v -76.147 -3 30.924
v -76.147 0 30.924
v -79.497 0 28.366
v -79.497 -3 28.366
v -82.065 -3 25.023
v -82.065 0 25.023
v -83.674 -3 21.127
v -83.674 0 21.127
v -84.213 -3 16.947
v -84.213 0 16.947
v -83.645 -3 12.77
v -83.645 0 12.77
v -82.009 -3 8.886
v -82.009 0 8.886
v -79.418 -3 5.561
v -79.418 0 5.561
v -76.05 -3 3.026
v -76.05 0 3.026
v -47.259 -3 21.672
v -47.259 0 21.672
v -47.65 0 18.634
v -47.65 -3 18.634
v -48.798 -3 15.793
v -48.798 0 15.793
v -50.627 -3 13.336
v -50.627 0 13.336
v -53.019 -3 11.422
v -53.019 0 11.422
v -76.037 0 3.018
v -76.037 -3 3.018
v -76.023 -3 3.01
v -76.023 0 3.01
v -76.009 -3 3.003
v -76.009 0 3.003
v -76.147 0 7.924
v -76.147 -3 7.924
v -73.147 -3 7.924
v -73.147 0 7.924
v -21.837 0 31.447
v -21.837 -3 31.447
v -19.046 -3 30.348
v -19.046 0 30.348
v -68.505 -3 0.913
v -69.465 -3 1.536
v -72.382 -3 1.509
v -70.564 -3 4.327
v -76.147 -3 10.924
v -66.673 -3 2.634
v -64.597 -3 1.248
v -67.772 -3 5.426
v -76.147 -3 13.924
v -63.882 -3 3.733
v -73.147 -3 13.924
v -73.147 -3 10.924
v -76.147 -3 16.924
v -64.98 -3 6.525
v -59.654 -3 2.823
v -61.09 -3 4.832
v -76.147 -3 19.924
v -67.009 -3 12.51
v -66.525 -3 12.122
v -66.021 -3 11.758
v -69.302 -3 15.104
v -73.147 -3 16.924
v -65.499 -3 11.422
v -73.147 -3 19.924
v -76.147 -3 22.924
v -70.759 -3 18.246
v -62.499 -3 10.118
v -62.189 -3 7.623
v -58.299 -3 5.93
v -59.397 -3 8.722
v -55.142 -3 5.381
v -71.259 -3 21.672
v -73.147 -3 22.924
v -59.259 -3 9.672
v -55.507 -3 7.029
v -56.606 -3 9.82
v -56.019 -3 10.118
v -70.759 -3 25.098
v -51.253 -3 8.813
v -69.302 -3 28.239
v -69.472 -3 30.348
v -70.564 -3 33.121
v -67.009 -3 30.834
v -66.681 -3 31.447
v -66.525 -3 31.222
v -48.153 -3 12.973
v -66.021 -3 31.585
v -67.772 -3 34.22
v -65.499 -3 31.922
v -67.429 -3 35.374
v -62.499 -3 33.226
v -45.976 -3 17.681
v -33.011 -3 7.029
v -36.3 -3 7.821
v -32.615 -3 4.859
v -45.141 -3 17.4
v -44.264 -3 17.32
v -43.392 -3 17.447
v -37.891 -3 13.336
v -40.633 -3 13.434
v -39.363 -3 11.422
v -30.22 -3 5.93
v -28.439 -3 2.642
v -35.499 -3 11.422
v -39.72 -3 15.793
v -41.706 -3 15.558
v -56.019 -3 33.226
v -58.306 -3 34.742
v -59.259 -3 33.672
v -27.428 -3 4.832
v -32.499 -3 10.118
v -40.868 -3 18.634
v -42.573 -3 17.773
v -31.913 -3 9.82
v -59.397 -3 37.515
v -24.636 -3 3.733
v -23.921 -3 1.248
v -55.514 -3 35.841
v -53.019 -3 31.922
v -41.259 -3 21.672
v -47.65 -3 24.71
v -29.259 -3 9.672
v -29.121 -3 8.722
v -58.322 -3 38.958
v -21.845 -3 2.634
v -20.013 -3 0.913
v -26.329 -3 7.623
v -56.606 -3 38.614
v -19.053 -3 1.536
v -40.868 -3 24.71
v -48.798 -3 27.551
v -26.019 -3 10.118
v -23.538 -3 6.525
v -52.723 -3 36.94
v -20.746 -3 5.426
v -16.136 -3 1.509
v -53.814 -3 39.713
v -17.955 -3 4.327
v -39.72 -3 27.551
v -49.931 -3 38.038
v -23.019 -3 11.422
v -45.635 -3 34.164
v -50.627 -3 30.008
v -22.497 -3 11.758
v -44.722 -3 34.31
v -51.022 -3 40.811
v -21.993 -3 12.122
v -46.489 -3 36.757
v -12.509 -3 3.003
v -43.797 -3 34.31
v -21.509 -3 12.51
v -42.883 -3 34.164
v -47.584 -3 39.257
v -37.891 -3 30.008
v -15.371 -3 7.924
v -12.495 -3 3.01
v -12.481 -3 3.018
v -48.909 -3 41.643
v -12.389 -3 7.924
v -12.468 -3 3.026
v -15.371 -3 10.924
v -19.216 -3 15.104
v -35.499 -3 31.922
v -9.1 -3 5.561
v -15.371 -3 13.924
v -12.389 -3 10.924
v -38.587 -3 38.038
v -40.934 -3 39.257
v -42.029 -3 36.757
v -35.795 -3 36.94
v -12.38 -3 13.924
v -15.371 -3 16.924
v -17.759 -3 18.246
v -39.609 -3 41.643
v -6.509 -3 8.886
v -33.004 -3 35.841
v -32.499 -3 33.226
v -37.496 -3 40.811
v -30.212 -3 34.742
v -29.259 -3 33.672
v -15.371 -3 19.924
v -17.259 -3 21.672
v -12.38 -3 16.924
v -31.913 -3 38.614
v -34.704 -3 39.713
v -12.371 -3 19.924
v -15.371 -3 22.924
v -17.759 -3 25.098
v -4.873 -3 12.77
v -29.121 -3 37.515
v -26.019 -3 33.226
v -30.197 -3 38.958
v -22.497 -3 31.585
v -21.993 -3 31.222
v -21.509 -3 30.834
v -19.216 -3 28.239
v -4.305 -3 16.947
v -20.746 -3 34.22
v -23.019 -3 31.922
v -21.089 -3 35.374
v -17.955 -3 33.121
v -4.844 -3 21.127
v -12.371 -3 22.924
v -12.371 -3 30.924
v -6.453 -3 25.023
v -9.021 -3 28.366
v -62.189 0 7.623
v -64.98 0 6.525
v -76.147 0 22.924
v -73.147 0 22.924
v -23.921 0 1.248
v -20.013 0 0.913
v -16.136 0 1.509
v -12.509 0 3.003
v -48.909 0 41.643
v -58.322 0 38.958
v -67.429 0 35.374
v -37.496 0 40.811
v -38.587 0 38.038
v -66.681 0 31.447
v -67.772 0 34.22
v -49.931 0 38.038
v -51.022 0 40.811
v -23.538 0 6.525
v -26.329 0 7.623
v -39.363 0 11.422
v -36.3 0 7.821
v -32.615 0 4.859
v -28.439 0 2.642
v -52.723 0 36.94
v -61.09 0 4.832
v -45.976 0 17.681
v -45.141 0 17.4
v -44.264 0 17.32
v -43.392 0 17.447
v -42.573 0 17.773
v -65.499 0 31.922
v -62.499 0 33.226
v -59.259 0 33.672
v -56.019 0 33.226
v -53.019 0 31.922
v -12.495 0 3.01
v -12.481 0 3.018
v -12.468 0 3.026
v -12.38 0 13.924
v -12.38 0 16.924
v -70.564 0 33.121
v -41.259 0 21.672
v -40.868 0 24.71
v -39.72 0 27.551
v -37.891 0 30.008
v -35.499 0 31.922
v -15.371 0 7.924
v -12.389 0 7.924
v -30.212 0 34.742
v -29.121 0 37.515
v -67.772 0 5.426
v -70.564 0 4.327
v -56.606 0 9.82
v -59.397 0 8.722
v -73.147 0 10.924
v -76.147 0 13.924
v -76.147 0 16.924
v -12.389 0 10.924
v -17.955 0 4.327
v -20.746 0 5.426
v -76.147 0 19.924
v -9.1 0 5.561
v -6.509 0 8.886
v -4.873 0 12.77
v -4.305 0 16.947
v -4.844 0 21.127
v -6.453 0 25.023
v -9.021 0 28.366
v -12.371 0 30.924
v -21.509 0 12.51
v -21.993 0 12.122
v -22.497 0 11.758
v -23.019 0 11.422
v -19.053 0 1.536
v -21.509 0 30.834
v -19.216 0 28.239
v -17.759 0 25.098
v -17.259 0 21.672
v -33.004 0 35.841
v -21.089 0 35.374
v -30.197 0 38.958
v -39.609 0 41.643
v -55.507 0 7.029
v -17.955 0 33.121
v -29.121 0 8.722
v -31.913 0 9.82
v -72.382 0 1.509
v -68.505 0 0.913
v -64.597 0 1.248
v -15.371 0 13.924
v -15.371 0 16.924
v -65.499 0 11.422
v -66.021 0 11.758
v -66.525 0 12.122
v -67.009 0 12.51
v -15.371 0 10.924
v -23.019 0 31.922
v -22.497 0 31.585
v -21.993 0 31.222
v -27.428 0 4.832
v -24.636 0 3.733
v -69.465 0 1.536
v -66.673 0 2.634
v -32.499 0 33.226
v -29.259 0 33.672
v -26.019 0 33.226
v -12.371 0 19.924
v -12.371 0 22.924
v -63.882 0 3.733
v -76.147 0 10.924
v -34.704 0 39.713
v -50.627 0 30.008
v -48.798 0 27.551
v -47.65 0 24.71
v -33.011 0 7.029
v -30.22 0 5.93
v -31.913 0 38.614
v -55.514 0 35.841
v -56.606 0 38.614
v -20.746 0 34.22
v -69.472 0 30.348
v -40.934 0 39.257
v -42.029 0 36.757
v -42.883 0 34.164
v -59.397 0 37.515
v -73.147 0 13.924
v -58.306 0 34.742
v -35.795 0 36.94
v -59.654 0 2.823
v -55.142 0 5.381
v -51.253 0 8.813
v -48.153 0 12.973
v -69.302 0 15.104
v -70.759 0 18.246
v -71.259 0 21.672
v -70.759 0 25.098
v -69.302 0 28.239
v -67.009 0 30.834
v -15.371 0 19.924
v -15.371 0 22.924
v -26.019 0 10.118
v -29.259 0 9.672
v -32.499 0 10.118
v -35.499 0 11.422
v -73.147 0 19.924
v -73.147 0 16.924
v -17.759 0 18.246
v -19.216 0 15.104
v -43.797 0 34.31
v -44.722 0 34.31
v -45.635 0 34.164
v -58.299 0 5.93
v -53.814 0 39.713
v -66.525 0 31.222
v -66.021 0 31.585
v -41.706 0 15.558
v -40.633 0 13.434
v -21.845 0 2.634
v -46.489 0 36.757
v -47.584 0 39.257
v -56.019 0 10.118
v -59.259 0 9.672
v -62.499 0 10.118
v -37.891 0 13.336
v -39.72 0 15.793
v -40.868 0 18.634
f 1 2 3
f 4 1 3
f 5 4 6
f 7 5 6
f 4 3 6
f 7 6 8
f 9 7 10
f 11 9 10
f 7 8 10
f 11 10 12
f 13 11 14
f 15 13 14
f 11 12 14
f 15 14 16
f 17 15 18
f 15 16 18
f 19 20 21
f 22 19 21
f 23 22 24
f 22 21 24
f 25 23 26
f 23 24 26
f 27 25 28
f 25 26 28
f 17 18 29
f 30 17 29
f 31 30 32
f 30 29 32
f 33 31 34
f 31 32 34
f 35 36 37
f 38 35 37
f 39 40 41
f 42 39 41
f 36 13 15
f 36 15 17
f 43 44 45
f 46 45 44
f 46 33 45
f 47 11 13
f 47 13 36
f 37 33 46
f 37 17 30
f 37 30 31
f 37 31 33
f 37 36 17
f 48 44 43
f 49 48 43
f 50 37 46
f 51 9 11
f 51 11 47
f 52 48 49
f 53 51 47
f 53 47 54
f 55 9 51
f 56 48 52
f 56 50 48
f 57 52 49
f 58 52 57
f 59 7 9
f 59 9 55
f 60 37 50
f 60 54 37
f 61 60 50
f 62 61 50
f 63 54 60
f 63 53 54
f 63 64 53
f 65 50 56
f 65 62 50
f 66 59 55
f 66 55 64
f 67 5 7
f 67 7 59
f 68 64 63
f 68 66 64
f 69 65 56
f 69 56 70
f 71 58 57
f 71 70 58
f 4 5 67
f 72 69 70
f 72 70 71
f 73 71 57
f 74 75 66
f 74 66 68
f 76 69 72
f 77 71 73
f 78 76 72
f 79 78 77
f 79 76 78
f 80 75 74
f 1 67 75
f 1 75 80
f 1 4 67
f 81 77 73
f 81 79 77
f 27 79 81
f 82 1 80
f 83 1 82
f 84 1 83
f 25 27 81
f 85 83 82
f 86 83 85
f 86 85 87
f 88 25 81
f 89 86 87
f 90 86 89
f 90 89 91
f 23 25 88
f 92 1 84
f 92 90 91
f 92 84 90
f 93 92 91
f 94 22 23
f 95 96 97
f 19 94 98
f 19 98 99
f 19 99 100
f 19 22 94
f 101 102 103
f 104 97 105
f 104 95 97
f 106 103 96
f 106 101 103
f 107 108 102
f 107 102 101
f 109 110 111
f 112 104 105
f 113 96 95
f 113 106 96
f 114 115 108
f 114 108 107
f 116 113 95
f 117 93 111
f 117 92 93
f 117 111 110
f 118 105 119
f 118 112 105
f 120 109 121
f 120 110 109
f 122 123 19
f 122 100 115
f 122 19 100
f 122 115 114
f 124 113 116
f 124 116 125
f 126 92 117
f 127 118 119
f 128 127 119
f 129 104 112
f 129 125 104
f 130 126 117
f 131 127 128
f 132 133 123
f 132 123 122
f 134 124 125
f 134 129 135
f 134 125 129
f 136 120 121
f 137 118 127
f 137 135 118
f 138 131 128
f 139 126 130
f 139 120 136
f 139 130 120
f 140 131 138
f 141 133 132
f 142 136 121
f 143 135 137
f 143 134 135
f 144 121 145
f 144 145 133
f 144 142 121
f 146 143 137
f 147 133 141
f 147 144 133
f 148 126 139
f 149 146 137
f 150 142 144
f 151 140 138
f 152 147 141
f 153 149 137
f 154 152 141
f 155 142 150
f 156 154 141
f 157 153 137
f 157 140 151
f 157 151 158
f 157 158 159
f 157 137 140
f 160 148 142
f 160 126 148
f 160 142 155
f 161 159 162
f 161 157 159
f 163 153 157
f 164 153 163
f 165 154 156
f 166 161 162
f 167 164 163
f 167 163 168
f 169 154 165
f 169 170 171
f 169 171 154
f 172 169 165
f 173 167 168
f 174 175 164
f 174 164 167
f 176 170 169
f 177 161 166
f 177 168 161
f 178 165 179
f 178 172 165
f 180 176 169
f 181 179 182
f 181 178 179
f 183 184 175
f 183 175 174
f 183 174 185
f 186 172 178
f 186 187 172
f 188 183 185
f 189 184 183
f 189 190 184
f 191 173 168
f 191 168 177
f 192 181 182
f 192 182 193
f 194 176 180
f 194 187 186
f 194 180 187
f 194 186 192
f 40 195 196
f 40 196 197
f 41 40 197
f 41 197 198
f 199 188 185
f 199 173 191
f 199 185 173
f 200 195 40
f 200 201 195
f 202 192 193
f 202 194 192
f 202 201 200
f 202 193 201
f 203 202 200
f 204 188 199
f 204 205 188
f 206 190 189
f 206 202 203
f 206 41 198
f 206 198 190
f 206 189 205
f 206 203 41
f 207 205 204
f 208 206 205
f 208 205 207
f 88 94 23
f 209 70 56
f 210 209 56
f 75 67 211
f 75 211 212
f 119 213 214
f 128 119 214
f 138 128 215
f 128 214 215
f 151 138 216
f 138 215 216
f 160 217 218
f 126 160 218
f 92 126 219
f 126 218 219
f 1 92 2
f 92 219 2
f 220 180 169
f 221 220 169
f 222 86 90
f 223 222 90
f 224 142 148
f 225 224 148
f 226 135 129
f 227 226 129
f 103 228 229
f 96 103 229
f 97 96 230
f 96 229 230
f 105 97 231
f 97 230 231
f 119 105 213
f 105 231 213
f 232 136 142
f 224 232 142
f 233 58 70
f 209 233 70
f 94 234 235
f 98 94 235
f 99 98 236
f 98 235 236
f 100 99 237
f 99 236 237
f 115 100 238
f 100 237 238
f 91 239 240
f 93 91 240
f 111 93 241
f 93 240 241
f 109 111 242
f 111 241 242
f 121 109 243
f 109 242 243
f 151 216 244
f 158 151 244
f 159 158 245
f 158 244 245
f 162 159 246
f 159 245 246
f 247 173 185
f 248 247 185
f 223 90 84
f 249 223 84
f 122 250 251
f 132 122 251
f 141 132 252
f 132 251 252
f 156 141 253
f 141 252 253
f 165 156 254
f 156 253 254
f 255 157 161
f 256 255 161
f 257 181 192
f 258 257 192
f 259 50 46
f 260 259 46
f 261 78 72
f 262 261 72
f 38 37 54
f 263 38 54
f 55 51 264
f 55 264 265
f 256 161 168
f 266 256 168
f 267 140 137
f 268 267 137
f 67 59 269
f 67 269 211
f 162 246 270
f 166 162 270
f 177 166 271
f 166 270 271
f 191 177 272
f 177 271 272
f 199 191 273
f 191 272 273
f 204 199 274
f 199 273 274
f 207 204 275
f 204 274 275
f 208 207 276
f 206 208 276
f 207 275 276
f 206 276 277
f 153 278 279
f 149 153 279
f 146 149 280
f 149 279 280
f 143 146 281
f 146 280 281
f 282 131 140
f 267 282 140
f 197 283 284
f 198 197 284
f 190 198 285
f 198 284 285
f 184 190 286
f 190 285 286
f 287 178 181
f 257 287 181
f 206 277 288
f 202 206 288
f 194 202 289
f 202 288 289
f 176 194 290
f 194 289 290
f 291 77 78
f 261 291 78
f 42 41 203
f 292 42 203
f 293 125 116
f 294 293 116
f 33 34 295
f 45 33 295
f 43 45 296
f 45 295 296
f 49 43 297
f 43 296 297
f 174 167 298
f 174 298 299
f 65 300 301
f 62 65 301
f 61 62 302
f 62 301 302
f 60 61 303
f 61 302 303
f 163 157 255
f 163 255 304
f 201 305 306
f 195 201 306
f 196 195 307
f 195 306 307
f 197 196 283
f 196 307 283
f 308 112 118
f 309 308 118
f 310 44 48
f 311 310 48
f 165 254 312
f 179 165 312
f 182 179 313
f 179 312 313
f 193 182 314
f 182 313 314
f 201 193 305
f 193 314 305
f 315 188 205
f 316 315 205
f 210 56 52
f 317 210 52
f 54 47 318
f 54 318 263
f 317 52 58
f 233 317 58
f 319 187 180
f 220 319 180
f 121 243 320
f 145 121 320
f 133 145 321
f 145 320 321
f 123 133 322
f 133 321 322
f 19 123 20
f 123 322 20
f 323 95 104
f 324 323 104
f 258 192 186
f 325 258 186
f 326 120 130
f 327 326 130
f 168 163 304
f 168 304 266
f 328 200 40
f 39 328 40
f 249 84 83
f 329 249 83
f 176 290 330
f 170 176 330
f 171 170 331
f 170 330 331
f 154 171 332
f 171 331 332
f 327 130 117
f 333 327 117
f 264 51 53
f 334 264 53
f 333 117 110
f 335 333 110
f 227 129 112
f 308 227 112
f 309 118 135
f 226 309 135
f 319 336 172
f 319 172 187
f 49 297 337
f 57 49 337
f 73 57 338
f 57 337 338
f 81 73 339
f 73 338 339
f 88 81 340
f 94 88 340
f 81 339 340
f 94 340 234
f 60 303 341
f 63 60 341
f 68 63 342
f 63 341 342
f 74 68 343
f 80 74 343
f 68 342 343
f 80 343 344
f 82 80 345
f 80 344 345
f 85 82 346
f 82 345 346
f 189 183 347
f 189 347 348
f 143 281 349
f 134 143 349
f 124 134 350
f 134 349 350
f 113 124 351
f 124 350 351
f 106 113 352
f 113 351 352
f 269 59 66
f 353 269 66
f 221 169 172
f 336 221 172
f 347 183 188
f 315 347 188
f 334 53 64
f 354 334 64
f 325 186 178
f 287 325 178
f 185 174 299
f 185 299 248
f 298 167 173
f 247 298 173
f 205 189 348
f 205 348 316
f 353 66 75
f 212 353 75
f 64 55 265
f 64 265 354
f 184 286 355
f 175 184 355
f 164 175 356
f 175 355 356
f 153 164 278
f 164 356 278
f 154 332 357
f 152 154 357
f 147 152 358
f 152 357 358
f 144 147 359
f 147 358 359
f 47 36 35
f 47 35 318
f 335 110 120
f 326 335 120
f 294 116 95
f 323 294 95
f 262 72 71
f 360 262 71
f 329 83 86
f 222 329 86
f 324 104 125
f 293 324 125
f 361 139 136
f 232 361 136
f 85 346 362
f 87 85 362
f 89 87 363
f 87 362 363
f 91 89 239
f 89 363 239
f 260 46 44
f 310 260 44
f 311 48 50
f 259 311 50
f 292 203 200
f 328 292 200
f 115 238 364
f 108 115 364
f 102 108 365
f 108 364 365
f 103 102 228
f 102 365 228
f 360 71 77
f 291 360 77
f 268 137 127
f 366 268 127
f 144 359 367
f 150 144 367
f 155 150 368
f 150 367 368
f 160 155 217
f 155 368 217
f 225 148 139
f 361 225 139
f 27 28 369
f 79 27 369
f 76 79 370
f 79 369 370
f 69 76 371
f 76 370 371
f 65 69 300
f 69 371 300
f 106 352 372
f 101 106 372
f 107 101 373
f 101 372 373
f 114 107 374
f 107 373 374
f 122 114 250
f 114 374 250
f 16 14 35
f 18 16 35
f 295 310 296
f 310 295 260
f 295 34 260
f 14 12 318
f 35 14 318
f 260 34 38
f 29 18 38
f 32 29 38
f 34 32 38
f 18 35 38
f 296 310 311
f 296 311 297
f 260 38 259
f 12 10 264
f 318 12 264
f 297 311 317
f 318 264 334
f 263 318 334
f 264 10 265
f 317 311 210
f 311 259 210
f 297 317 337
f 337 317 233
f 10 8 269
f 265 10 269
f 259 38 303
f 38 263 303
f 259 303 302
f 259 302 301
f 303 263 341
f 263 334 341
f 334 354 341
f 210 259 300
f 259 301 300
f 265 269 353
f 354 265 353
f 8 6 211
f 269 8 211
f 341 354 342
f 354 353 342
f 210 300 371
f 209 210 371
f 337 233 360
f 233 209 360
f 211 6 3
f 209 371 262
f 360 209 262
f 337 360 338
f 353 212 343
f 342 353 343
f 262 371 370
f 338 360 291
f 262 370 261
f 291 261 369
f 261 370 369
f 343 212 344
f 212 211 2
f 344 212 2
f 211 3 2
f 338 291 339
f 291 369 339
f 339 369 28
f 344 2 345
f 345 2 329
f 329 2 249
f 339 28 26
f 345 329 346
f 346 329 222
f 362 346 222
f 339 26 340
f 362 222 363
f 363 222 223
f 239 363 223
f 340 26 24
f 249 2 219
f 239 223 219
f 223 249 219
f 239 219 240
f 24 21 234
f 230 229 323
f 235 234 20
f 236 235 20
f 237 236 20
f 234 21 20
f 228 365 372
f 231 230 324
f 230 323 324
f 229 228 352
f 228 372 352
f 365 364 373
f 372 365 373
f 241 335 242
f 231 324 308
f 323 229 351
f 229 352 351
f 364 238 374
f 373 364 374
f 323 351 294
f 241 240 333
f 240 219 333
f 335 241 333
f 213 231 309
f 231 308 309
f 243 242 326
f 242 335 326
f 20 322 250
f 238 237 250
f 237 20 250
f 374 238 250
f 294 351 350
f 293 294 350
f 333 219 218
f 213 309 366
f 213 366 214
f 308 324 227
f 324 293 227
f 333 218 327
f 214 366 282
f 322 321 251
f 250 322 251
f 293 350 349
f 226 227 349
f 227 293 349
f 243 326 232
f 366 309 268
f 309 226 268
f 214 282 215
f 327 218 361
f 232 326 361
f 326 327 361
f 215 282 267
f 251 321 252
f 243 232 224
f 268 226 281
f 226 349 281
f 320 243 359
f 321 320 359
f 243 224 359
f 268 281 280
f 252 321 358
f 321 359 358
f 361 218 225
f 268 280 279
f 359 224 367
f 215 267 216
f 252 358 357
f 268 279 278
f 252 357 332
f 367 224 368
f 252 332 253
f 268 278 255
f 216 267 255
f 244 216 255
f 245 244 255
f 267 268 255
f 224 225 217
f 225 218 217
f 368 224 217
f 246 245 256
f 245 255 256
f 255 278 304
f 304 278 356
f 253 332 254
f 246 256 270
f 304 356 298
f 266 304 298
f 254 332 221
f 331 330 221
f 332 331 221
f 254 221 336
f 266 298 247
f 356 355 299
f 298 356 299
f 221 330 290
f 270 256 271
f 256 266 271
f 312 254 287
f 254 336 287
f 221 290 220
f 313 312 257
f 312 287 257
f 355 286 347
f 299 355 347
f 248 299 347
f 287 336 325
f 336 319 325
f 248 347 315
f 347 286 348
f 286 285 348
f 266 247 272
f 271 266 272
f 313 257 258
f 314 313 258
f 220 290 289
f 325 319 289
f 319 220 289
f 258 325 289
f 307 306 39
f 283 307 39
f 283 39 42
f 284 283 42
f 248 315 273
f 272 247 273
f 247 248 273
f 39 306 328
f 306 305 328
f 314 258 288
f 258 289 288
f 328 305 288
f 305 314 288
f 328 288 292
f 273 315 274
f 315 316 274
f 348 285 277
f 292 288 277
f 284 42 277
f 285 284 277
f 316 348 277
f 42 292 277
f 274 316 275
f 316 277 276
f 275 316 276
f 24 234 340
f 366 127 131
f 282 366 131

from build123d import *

# Parameters (mm, degrees)
F1_DEPTH = 3
F2_W     = 2.9827502628
F2_H     = 3
F2_W_2   = 2.9913751314
F2_W_3   = 3
F3_DEPTH = 25


# Not quite as in the source:
# - ends of sketch curves that miss each other by under 0.0002 mm in the source are joined


with BuildPart() as f1:
    # F0 (on Front) → F1 (new body)
    with BuildSketch(Plane.XZ):
        with BuildLine():
            ThreePointArc((-65.4990487043, 31.9219294953), (-59.2590567172, 33.6719294953), (-53.01906473, 31.9219294953))
            Line((-53.01906473, 31.9219294953), (-45.1069841329, 31.9219294953))
            ThreePointArc((-45.1069841329, 31.9219294953), (-45.3487223927, 33.0483271736), (-45.635105941, 34.1642095953))
            ThreePointArc((-45.635105941, 34.1642095953), (-47.0071291889, 38.0195574022), (-48.9092989792, 41.6428024387))
            ThreePointArc((-48.9092989792, 41.6428024387), (-62.9189036621, 37.276531414), (-76.1468158191, 30.9239188806))
            ThreePointArc((-76.1468158191, 30.9239188806), (-84.213049611, 16.9468180053), (-76.0504636415, 3.0257667966))
            ThreePointArc((-76.0504636415, 3.0257667966), (-76.029966864, 3.0142304296), (-76.0094479368, 3.0027335048))
            ThreePointArc((-76.0094479368, 3.0027335048), (-70.4614460946, 1.0953454703), (-64.596721114, 1.2484939552))
            ThreePointArc((-64.596721114, 1.2484939552), (-55.9033559949, 4.8590380101), (-49.1550909719, 11.4219294953))
            Line((-49.1550909719, 11.4219294953), (-53.01906473, 11.4219294953))
            ThreePointArc((-53.01906473, 11.4219294953), (-59.2590567172, 9.6719294953), (-65.4990487043, 11.4219294953))
            Line((-65.4990487043, 11.4219294953), (-67.0090567172, 11.4219294953))
            Line((-67.0090567172, 11.4219294953), (-67.0090567172, 12.5101883944))
            ThreePointArc((-67.0090567172, 12.5101883944), (-71.2590567172, 21.6719294953), (-67.0090567172, 30.8336705962))
            Line((-67.0090567172, 30.8336705962), (-67.0090567172, 31.9219294953))
            Line((-67.0090567172, 31.9219294953), (-65.4990487043, 31.9219294953))
        make_face()
        with BuildLine():
            ThreePointArc((-42.8830074933, 34.1642095953), (-43.1693910416, 33.0483271736), (-43.4111293014, 31.9219294953))
            Line((-43.4111293014, 31.9219294953), (-35.4990487043, 31.9219294953))
            ThreePointArc((-35.4990487043, 31.9219294953), (-29.2590567172, 33.6719294953), (-23.01906473, 31.9219294953))
            Line((-23.01906473, 31.9219294953), (-21.5090567172, 31.9219294953))
            Line((-21.5090567172, 31.9219294953), (-21.5090567172, 30.8336705962))
            ThreePointArc((-21.5090567172, 30.8336705962), (-18.3732861886, 26.7216819645), (-17.2590567172, 21.6719294953))
            ThreePointArc((-17.2590567172, 21.6719294953), (-18.3732861886, 16.6221770261), (-21.5090567172, 12.5101883944))
            Line((-21.5090567172, 12.5101883944), (-21.5090567172, 11.4219294953))
            Line((-21.5090567172, 11.4219294953), (-23.01906473, 11.4219294953))
            ThreePointArc((-23.01906473, 11.4219294953), (-29.2590567172, 9.6719294953), (-35.4990487043, 11.4219294953))
            Line((-35.4990487043, 11.4219294953), (-39.3630224624, 11.4219294953))
            ThreePointArc((-39.3630224624, 11.4219294953), (-32.6147574394, 4.8590380101), (-23.9213923203, 1.2484939552))
            ThreePointArc((-23.9213923203, 1.2484939552), (-18.0566673397, 1.0953454703), (-12.5086654975, 3.0027335048))
            ThreePointArc((-12.5086654975, 3.0027335048), (-12.4881465704, 3.0142304296), (-12.4676497928, 3.0257667966))
            ThreePointArc((-12.4676497928, 3.0257667966), (-4.3050638233, 16.9468180053), (-12.3712976152, 30.9239188806))
            ThreePointArc((-12.3712976152, 30.9239188806), (-25.5992097722, 37.276531414), (-39.6088144552, 41.6428024387))
            ThreePointArc((-39.6088144552, 41.6428024387), (-41.5109842454, 38.0195574022), (-42.8830074933, 34.1642095953))
        make_face()
        with BuildLine():
            Line((-43.5487545967, 21.6719294953), (-44.9693588376, 21.6719294953))
            ThreePointArc((-44.9693588376, 21.6719294953), (-45.3908188129, 19.6558686516), (-45.9763922185, 17.6812209304))
            ThreePointArc((-45.9763922185, 17.6812209304), (-44.2636810752, 17.3202159397), (-42.5729841678, 17.7732590184))
            ThreePointArc((-42.5729841678, 17.7732590184), (-43.1391404553, 19.7030043482), (-43.5487545967, 21.6719294953))
        make_face()
        with BuildLine():
            ThreePointArc((-43.559121813, 21.7346880473), (-43.5539581146, 21.7033054824), (-43.5487545967, 21.6719294953))
            Line((-43.5487545967, 21.6719294953), (-41.2590567172, 21.6719294953))
            ThreePointArc((-41.2590567172, 21.6719294953), (-39.7204118838, 27.550708967), (-35.4990487043, 31.9219294953))
            Line((-35.4990487043, 31.9219294953), (-43.4111293014, 31.9219294953))
            ThreePointArc((-43.4111293014, 31.9219294953), (-43.9370167563, 26.8348735037), (-43.559121813, 21.7346880473))
        make_face()
        with BuildLine():
            ThreePointArc((-53.01906473, 31.9219294953), (-48.7977015505, 27.550708967), (-47.2590567172, 21.6719294953))
            Line((-47.2590567172, 21.6719294953), (-44.9693588376, 21.6719294953))
            ThreePointArc((-44.9693588376, 21.6719294953), (-44.9641553197, 21.7033054824), (-44.9589916213, 21.7346880473))
            ThreePointArc((-44.9589916213, 21.7346880473), (-44.581096678, 26.8348735037), (-45.1069841329, 31.9219294953))
            Line((-45.1069841329, 31.9219294953), (-53.01906473, 31.9219294953))
        make_face()
        with BuildLine():
            Line((-44.9693588376, 21.6719294953), (-47.2590567172, 21.6719294953))
            ThreePointArc((-47.2590567172, 21.6719294953), (-48.7977015505, 15.7931500236), (-53.01906473, 11.4219294953))
            Line((-53.01906473, 11.4219294953), (-49.1550909719, 11.4219294953))
            ThreePointArc((-49.1550909719, 11.4219294953), (-47.3455028522, 14.4397298666), (-45.9763922185, 17.6812209304))
            ThreePointArc((-45.9763922185, 17.6812209304), (-45.3908188129, 19.6558686516), (-44.9693588376, 21.6719294953))
        make_face()
        with BuildLine():
            Line((-41.2590567172, 21.6719294953), (-43.5487545967, 21.6719294953))
            ThreePointArc((-43.5487545967, 21.6719294953), (-43.1391404553, 19.7030043482), (-42.5729841678, 17.7732590184))
            ThreePointArc((-42.5729841678, 17.7732590184), (-41.1945750254, 14.4830849229), (-39.3630224624, 11.4219294953))
            Line((-39.3630224624, 11.4219294953), (-35.4990487043, 11.4219294953))
            ThreePointArc((-35.4990487043, 11.4219294953), (-39.7204118838, 15.7931500236), (-41.2590567172, 21.6719294953))
        make_face()
        with BuildLine():
            ThreePointArc((-44.9589916213, 21.7346880473), (-44.9641553197, 21.7033054824), (-44.9693588376, 21.6719294953))
            Line((-44.9693588376, 21.6719294953), (-43.5487545967, 21.6719294953))
            ThreePointArc((-43.5487545967, 21.6719294953), (-43.5539581146, 21.7033054824), (-43.559121813, 21.7346880473))
            ThreePointArc((-43.559121813, 21.7346880473), (-43.9370167563, 26.8348735037), (-43.4111293014, 31.9219294953))
            Line((-43.4111293014, 31.9219294953), (-45.1069841329, 31.9219294953))
            ThreePointArc((-45.1069841329, 31.9219294953), (-44.581096678, 26.8348735037), (-44.9589916213, 21.7346880473))
        make_face()
        with BuildLine():
            ThreePointArc((-45.635105941, 34.1642095953), (-45.3487223927, 33.0483271736), (-45.1069841329, 31.9219294953))
            Line((-45.1069841329, 31.9219294953), (-43.4111293014, 31.9219294953))
            ThreePointArc((-43.4111293014, 31.9219294953), (-43.1693910416, 33.0483271736), (-42.8830074933, 34.1642095953))
            ThreePointArc((-42.8830074933, 34.1642095953), (-44.2590567172, 34.327758758), (-45.635105941, 34.1642095953))
        make_face()
        with BuildLine():
            Line((-67.0090567172, 11.4219294953), (-65.4990487043, 11.4219294953))
            ThreePointArc((-65.4990487043, 11.4219294953), (-66.2751842679, 11.9367379619), (-67.0090567172, 12.5101883944))
            Line((-67.0090567172, 12.5101883944), (-67.0090567172, 11.4219294953))
        make_face()
        with BuildLine():
            ThreePointArc((-21.5090567172, 12.5101883944), (-22.2429291664, 11.9367379619), (-23.01906473, 11.4219294953))
            Line((-23.01906473, 11.4219294953), (-21.5090567172, 11.4219294953))
            Line((-21.5090567172, 11.4219294953), (-21.5090567172, 12.5101883944))
        make_face()
        with BuildLine():
            Line((-21.5090567172, 31.9219294953), (-23.01906473, 31.9219294953))
            ThreePointArc((-23.01906473, 31.9219294953), (-22.2429291664, 31.4071210287), (-21.5090567172, 30.8336705962))
            Line((-21.5090567172, 30.8336705962), (-21.5090567172, 31.9219294953))
        make_face()
        with BuildLine():
            ThreePointArc((-67.0090567172, 30.8336705962), (-66.2751842679, 31.4071210287), (-65.4990487043, 31.9219294953))
            Line((-65.4990487043, 31.9219294953), (-67.0090567172, 31.9219294953))
            Line((-67.0090567172, 31.9219294953), (-67.0090567172, 30.8336705962))
        make_face()
    extrude(amount=F1_DEPTH)

    # F2 (on face) → F3 (cut)
    with BuildSketch(Plane.XZ.offset(3)):
        Polygon((-67.7719824437, 5.4260265126), (-70.5635935688, 4.3274331729), (-69.4650002292, 1.5358220478), (-66.673389104, 2.6344153875), align=None)
        Polygon((-29.1209643657, 8.7218065315), (-31.9125754908, 9.8203998712), (-33.0111329333, 7.0288799637), (-30.2195218081, 5.930286624), align=None)
        Polygon((-23.5377421156, 6.5246198522), (-26.3293532407, 7.6232131919), (-27.4279286318, 4.8316476756), (-24.6363175066, 3.7330543359), align=None)
        Polygon((-19.0531132051, 1.5358220478), (-17.9545198655, 4.3274331729), (-20.7461309906, 5.4260265126), (-21.8447243303, 2.6344153875), align=None)
        with Locations((-13.8799224838, 9.4239312787)):
            Rectangle(F2_W, F2_H)
        with Locations((-13.8756100495, 15.4239250796)):
            Rectangle(F2_W_2, F2_H)
        with Locations((-13.8712976152, 21.4239188806)):
            Rectangle(F2_W_3, F2_H)
        Polygon((-19.0457892079, 30.3481052815), (-17.9545198238, 33.1211056658), (-20.7461309906, 34.2196988996), (-21.837400333, 31.4466986212), align=None)
        Polygon((-29.120964366, 37.5154789187), (-31.9125754912, 38.6140722584), (-33.0038447503, 35.8410721917), (-30.2122336251, 34.742478852), align=None)
        Polygon((-34.7041866163, 39.712665598), (-37.4957977415, 40.8112589377), (-38.5870669589, 38.0382589769), (-35.7954558337, 36.9396656372), align=None)
        Polygon((-67.7719824437, 34.2196988996), (-70.5635935688, 33.12110556), (-69.4723242264, 30.3481052815), (-66.6807131013, 31.4466986212), align=None)
        Polygon((-55.5142686841, 35.8410721917), (-56.6055380681, 38.614072576), (-59.3971490683, 37.5154789187), (-58.3058798092, 34.742478852), align=None)
        Polygon((-49.9310464754, 38.0382589769), (-51.0223158595, 40.8112593612), (-53.813926818, 39.712665598), (-52.7226576006, 36.9396656372), align=None)
        with Locations((-74.6468158191, 21.4239188806)):
            Rectangle(F2_W_3, F2_H)
        with Locations((-74.6468158191, 9.4239419771)):
            Rectangle(F2_W_3, F2_H)
        Polygon((-61.0901668537, 4.8316020668), (-62.1887601934, 7.623213192), (-64.9803713186, 6.5246198523), (-63.8817779789, 3.7330087272), align=None)
        Polygon((-55.5069446035, 7.0287887462), (-56.6055379431, 9.8203998713), (-59.3971490683, 8.7218065317), (-58.2985557286, 5.9301954065), align=None)
        with Locations((-74.6468158191, 15.4239304289)):
            Rectangle(F2_W_3, F2_H)
    extrude(amount=-F3_DEPTH, mode=Mode.SUBTRACT)


solid = f1.part
